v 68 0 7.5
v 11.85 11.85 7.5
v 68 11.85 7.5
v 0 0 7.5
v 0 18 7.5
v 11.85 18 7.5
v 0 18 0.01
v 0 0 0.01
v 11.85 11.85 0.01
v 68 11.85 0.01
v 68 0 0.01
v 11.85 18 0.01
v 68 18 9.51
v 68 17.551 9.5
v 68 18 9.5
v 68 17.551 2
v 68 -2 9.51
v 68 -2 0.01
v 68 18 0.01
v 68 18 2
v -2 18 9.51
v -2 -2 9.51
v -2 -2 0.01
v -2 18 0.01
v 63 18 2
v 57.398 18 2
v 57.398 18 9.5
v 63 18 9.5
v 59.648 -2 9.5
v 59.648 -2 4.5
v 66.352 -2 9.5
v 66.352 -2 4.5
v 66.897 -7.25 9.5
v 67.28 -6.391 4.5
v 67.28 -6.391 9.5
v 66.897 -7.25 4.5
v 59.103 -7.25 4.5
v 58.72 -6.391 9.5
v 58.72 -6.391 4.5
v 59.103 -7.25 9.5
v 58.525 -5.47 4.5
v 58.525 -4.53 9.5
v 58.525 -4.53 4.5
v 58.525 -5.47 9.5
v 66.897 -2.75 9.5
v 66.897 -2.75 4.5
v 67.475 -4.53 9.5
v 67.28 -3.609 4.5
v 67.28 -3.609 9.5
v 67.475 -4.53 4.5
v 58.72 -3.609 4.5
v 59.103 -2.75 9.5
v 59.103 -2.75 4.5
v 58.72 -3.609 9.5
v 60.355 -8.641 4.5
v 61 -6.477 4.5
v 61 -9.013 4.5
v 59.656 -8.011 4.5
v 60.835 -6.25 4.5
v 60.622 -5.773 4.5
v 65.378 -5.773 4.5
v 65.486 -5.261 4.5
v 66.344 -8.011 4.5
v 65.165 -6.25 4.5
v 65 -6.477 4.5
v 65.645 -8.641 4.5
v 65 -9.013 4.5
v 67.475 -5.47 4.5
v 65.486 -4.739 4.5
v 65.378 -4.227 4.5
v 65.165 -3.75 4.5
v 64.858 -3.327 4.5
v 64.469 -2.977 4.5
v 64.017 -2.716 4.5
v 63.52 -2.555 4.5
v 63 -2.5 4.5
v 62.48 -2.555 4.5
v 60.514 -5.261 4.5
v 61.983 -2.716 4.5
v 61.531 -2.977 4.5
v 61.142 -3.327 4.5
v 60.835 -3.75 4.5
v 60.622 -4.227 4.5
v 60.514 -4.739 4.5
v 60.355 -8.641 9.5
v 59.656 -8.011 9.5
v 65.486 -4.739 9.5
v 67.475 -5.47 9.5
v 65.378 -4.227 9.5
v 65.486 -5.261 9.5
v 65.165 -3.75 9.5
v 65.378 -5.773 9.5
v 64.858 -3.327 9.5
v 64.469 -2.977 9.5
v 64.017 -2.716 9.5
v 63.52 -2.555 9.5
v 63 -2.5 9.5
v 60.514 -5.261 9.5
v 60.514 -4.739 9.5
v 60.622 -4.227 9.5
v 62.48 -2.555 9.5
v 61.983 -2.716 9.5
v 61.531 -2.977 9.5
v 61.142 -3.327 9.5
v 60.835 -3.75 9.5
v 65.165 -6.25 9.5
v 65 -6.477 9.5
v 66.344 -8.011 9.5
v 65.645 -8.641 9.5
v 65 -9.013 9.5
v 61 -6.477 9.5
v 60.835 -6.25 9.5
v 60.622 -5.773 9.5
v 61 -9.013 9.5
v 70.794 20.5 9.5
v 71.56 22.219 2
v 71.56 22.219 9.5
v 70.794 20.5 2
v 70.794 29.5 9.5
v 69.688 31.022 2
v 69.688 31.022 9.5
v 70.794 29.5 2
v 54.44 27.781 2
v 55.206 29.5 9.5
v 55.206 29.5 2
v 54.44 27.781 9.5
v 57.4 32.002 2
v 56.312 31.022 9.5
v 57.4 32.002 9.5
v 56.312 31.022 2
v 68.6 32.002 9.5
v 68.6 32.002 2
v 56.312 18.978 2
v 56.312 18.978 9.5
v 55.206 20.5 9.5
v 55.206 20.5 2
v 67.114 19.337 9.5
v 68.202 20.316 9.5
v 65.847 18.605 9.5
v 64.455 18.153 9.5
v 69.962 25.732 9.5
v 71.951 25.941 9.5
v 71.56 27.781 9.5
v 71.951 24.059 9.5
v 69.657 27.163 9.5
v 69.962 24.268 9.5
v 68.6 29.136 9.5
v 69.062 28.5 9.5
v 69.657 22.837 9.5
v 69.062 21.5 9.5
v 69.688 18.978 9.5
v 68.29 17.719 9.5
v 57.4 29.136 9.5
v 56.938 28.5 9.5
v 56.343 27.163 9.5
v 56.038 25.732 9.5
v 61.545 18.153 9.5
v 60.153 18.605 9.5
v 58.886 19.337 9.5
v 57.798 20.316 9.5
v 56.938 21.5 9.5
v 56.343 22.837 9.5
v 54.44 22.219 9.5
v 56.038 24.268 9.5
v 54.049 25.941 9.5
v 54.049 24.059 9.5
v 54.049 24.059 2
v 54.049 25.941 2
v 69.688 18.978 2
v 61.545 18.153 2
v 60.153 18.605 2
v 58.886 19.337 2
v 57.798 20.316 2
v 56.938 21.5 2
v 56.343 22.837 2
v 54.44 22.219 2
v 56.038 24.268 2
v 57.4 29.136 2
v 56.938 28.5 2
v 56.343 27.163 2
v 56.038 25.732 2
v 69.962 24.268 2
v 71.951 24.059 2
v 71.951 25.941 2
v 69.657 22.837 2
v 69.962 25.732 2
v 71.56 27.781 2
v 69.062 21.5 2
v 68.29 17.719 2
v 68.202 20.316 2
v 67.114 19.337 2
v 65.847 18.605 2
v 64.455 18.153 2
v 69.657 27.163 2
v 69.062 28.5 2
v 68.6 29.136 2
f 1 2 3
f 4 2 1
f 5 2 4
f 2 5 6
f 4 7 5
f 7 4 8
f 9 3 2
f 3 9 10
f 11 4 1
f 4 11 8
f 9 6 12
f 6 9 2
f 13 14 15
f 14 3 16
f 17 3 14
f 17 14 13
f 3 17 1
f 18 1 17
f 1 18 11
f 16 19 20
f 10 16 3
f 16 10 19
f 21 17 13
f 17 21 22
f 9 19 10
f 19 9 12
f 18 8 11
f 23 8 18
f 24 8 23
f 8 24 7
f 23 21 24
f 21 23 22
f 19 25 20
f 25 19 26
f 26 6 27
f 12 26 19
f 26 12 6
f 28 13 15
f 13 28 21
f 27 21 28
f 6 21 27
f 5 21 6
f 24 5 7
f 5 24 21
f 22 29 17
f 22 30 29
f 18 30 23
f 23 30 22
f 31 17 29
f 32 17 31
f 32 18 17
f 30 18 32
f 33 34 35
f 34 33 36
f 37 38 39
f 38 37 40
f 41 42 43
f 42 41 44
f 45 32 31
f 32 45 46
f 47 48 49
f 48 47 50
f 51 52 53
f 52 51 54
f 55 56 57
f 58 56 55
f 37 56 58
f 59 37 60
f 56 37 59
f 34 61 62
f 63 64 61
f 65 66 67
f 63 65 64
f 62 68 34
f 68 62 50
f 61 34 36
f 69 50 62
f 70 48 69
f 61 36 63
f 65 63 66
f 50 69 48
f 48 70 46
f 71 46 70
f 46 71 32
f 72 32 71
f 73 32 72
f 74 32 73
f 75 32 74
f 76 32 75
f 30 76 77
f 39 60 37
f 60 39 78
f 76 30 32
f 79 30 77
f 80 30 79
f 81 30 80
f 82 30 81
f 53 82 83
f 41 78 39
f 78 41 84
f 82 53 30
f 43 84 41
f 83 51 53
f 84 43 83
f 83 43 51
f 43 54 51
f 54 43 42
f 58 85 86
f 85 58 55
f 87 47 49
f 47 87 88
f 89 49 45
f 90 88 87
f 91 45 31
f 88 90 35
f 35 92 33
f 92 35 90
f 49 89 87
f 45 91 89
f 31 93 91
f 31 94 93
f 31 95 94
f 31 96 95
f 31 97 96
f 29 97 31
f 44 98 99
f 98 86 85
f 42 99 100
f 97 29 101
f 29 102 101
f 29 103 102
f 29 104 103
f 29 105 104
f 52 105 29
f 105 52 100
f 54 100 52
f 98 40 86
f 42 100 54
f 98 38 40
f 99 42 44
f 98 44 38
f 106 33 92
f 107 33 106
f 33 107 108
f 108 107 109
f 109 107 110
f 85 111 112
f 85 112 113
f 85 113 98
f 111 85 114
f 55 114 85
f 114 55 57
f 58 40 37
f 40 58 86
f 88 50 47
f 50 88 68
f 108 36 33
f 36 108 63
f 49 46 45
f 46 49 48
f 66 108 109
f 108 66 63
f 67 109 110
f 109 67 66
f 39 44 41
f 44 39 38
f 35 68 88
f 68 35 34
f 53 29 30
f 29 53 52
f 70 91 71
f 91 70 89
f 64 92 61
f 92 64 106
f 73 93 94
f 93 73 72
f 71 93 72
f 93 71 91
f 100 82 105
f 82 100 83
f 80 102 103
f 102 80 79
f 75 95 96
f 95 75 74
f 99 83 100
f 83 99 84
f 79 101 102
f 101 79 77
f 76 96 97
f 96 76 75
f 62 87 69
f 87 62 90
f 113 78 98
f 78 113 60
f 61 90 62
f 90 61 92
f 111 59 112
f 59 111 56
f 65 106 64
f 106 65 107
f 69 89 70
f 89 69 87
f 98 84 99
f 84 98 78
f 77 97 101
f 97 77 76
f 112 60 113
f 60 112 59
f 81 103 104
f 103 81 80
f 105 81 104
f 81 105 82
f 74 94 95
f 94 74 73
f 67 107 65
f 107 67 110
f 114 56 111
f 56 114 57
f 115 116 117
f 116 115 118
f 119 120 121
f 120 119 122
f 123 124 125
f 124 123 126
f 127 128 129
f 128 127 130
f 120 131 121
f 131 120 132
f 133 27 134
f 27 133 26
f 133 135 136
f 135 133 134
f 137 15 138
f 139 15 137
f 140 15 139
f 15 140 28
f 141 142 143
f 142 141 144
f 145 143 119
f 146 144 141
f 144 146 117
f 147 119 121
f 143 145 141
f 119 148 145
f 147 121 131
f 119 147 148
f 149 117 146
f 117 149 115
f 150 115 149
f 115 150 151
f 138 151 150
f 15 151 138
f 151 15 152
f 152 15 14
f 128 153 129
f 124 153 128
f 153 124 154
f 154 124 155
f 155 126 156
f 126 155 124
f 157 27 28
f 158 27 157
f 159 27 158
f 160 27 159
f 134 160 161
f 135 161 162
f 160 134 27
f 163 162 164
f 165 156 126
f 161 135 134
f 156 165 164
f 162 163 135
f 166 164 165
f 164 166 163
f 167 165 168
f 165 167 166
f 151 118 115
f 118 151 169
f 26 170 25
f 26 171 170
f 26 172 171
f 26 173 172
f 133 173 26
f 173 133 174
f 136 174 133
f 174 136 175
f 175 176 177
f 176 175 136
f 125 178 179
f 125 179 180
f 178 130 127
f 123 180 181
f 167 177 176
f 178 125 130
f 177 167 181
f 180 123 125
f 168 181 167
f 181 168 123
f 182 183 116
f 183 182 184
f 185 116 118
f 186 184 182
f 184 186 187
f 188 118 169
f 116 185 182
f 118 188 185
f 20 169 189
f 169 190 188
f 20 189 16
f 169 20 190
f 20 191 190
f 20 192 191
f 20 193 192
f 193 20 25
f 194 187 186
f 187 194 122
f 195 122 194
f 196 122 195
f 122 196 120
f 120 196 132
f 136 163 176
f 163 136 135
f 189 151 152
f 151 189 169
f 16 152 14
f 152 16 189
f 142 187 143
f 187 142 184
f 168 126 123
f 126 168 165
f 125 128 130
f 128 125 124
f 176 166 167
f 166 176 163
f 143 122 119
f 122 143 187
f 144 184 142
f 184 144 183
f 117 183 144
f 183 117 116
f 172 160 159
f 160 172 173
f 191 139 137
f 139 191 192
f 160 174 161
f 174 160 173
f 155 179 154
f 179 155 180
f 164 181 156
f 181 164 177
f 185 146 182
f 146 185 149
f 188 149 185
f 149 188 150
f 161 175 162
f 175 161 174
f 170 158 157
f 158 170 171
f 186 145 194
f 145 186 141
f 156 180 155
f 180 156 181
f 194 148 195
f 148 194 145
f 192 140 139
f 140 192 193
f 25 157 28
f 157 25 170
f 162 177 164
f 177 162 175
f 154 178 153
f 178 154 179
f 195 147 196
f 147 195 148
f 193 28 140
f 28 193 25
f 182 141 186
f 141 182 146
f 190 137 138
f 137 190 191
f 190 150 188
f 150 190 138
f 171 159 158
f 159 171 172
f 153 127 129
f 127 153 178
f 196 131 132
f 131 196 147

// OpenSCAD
//
// 29g tank rim bracket for holding a Neptune Apex temperature probe
// Design by Chris Sammis, 2017
//

/****** Constants ********************/
RIM_HEIGHT  = 7.5;      // These work well for a 29g from Petco
RIM_WIDTH   = 11.85;
CUTOUT_LENGTH = 100;

/****** Bracket dimensions ***********/
bracket_length  = 70;
bracket_width   = 20;
edge_width      = 2;

/****** Probe cord dimensions ********/
cord_diameter       = 5;
cord_wall_width     = 2;
cord_ring_height    = 5;

/****** Probe dimensions *************/
probe_outer_diameter    = 14;
probe_ring_height       = RIM_HEIGHT;

// Generic ring for holding a cylindrical object (probe, cord, airline, etc.)
module holder_ring(inner_diameter, wall_width, height)
{
    ring_resolution = 30;

    difference()
    {
        cylinder(r=(inner_diameter / 2) + wall_width, h=height, $fn=ring_resolution);
        translate([0, 0, -0.01])
            cylinder(r=inner_diameter / 2, h=height + 0.02, $fn=ring_resolution);

        // Open up 4/5s of the inner diameter to put the object through
        translate([inner_diameter / 2, 0, height / 2])
            cube([inner_diameter, (inner_diameter * 4) / 5, height * 2], center=true);
    }
}

module probe()
{
    translate([bracket_length - probe_outer_diameter / 2, -5, RIM_HEIGHT + edge_width - cord_ring_height])
        rotate([0, 0, -90])
            holder_ring(cord_diameter, cord_wall_width, cord_ring_height);

    translate([bracket_length - probe_outer_diameter / 2, bracket_width * 1.25, RIM_HEIGHT + edge_width - probe_ring_height])
        rotate([0, 0, 90])
            holder_ring(probe_outer_diameter, 2, probe_ring_height);
}

union()
{
    difference()
    {
        translate([edge_width * -1, edge_width * -1, 0.01])
        {
            cube([bracket_length, bracket_width, RIM_HEIGHT + edge_width]);
        }
        
        union()
        {
            cube([CUTOUT_LENGTH, RIM_WIDTH, RIM_HEIGHT]);
            translate([RIM_WIDTH, 0, 0])
                rotate([0, 0, 90])
                    cube([CUTOUT_LENGTH, RIM_WIDTH, RIM_HEIGHT]);
        }
    }
    
    probe();
}
